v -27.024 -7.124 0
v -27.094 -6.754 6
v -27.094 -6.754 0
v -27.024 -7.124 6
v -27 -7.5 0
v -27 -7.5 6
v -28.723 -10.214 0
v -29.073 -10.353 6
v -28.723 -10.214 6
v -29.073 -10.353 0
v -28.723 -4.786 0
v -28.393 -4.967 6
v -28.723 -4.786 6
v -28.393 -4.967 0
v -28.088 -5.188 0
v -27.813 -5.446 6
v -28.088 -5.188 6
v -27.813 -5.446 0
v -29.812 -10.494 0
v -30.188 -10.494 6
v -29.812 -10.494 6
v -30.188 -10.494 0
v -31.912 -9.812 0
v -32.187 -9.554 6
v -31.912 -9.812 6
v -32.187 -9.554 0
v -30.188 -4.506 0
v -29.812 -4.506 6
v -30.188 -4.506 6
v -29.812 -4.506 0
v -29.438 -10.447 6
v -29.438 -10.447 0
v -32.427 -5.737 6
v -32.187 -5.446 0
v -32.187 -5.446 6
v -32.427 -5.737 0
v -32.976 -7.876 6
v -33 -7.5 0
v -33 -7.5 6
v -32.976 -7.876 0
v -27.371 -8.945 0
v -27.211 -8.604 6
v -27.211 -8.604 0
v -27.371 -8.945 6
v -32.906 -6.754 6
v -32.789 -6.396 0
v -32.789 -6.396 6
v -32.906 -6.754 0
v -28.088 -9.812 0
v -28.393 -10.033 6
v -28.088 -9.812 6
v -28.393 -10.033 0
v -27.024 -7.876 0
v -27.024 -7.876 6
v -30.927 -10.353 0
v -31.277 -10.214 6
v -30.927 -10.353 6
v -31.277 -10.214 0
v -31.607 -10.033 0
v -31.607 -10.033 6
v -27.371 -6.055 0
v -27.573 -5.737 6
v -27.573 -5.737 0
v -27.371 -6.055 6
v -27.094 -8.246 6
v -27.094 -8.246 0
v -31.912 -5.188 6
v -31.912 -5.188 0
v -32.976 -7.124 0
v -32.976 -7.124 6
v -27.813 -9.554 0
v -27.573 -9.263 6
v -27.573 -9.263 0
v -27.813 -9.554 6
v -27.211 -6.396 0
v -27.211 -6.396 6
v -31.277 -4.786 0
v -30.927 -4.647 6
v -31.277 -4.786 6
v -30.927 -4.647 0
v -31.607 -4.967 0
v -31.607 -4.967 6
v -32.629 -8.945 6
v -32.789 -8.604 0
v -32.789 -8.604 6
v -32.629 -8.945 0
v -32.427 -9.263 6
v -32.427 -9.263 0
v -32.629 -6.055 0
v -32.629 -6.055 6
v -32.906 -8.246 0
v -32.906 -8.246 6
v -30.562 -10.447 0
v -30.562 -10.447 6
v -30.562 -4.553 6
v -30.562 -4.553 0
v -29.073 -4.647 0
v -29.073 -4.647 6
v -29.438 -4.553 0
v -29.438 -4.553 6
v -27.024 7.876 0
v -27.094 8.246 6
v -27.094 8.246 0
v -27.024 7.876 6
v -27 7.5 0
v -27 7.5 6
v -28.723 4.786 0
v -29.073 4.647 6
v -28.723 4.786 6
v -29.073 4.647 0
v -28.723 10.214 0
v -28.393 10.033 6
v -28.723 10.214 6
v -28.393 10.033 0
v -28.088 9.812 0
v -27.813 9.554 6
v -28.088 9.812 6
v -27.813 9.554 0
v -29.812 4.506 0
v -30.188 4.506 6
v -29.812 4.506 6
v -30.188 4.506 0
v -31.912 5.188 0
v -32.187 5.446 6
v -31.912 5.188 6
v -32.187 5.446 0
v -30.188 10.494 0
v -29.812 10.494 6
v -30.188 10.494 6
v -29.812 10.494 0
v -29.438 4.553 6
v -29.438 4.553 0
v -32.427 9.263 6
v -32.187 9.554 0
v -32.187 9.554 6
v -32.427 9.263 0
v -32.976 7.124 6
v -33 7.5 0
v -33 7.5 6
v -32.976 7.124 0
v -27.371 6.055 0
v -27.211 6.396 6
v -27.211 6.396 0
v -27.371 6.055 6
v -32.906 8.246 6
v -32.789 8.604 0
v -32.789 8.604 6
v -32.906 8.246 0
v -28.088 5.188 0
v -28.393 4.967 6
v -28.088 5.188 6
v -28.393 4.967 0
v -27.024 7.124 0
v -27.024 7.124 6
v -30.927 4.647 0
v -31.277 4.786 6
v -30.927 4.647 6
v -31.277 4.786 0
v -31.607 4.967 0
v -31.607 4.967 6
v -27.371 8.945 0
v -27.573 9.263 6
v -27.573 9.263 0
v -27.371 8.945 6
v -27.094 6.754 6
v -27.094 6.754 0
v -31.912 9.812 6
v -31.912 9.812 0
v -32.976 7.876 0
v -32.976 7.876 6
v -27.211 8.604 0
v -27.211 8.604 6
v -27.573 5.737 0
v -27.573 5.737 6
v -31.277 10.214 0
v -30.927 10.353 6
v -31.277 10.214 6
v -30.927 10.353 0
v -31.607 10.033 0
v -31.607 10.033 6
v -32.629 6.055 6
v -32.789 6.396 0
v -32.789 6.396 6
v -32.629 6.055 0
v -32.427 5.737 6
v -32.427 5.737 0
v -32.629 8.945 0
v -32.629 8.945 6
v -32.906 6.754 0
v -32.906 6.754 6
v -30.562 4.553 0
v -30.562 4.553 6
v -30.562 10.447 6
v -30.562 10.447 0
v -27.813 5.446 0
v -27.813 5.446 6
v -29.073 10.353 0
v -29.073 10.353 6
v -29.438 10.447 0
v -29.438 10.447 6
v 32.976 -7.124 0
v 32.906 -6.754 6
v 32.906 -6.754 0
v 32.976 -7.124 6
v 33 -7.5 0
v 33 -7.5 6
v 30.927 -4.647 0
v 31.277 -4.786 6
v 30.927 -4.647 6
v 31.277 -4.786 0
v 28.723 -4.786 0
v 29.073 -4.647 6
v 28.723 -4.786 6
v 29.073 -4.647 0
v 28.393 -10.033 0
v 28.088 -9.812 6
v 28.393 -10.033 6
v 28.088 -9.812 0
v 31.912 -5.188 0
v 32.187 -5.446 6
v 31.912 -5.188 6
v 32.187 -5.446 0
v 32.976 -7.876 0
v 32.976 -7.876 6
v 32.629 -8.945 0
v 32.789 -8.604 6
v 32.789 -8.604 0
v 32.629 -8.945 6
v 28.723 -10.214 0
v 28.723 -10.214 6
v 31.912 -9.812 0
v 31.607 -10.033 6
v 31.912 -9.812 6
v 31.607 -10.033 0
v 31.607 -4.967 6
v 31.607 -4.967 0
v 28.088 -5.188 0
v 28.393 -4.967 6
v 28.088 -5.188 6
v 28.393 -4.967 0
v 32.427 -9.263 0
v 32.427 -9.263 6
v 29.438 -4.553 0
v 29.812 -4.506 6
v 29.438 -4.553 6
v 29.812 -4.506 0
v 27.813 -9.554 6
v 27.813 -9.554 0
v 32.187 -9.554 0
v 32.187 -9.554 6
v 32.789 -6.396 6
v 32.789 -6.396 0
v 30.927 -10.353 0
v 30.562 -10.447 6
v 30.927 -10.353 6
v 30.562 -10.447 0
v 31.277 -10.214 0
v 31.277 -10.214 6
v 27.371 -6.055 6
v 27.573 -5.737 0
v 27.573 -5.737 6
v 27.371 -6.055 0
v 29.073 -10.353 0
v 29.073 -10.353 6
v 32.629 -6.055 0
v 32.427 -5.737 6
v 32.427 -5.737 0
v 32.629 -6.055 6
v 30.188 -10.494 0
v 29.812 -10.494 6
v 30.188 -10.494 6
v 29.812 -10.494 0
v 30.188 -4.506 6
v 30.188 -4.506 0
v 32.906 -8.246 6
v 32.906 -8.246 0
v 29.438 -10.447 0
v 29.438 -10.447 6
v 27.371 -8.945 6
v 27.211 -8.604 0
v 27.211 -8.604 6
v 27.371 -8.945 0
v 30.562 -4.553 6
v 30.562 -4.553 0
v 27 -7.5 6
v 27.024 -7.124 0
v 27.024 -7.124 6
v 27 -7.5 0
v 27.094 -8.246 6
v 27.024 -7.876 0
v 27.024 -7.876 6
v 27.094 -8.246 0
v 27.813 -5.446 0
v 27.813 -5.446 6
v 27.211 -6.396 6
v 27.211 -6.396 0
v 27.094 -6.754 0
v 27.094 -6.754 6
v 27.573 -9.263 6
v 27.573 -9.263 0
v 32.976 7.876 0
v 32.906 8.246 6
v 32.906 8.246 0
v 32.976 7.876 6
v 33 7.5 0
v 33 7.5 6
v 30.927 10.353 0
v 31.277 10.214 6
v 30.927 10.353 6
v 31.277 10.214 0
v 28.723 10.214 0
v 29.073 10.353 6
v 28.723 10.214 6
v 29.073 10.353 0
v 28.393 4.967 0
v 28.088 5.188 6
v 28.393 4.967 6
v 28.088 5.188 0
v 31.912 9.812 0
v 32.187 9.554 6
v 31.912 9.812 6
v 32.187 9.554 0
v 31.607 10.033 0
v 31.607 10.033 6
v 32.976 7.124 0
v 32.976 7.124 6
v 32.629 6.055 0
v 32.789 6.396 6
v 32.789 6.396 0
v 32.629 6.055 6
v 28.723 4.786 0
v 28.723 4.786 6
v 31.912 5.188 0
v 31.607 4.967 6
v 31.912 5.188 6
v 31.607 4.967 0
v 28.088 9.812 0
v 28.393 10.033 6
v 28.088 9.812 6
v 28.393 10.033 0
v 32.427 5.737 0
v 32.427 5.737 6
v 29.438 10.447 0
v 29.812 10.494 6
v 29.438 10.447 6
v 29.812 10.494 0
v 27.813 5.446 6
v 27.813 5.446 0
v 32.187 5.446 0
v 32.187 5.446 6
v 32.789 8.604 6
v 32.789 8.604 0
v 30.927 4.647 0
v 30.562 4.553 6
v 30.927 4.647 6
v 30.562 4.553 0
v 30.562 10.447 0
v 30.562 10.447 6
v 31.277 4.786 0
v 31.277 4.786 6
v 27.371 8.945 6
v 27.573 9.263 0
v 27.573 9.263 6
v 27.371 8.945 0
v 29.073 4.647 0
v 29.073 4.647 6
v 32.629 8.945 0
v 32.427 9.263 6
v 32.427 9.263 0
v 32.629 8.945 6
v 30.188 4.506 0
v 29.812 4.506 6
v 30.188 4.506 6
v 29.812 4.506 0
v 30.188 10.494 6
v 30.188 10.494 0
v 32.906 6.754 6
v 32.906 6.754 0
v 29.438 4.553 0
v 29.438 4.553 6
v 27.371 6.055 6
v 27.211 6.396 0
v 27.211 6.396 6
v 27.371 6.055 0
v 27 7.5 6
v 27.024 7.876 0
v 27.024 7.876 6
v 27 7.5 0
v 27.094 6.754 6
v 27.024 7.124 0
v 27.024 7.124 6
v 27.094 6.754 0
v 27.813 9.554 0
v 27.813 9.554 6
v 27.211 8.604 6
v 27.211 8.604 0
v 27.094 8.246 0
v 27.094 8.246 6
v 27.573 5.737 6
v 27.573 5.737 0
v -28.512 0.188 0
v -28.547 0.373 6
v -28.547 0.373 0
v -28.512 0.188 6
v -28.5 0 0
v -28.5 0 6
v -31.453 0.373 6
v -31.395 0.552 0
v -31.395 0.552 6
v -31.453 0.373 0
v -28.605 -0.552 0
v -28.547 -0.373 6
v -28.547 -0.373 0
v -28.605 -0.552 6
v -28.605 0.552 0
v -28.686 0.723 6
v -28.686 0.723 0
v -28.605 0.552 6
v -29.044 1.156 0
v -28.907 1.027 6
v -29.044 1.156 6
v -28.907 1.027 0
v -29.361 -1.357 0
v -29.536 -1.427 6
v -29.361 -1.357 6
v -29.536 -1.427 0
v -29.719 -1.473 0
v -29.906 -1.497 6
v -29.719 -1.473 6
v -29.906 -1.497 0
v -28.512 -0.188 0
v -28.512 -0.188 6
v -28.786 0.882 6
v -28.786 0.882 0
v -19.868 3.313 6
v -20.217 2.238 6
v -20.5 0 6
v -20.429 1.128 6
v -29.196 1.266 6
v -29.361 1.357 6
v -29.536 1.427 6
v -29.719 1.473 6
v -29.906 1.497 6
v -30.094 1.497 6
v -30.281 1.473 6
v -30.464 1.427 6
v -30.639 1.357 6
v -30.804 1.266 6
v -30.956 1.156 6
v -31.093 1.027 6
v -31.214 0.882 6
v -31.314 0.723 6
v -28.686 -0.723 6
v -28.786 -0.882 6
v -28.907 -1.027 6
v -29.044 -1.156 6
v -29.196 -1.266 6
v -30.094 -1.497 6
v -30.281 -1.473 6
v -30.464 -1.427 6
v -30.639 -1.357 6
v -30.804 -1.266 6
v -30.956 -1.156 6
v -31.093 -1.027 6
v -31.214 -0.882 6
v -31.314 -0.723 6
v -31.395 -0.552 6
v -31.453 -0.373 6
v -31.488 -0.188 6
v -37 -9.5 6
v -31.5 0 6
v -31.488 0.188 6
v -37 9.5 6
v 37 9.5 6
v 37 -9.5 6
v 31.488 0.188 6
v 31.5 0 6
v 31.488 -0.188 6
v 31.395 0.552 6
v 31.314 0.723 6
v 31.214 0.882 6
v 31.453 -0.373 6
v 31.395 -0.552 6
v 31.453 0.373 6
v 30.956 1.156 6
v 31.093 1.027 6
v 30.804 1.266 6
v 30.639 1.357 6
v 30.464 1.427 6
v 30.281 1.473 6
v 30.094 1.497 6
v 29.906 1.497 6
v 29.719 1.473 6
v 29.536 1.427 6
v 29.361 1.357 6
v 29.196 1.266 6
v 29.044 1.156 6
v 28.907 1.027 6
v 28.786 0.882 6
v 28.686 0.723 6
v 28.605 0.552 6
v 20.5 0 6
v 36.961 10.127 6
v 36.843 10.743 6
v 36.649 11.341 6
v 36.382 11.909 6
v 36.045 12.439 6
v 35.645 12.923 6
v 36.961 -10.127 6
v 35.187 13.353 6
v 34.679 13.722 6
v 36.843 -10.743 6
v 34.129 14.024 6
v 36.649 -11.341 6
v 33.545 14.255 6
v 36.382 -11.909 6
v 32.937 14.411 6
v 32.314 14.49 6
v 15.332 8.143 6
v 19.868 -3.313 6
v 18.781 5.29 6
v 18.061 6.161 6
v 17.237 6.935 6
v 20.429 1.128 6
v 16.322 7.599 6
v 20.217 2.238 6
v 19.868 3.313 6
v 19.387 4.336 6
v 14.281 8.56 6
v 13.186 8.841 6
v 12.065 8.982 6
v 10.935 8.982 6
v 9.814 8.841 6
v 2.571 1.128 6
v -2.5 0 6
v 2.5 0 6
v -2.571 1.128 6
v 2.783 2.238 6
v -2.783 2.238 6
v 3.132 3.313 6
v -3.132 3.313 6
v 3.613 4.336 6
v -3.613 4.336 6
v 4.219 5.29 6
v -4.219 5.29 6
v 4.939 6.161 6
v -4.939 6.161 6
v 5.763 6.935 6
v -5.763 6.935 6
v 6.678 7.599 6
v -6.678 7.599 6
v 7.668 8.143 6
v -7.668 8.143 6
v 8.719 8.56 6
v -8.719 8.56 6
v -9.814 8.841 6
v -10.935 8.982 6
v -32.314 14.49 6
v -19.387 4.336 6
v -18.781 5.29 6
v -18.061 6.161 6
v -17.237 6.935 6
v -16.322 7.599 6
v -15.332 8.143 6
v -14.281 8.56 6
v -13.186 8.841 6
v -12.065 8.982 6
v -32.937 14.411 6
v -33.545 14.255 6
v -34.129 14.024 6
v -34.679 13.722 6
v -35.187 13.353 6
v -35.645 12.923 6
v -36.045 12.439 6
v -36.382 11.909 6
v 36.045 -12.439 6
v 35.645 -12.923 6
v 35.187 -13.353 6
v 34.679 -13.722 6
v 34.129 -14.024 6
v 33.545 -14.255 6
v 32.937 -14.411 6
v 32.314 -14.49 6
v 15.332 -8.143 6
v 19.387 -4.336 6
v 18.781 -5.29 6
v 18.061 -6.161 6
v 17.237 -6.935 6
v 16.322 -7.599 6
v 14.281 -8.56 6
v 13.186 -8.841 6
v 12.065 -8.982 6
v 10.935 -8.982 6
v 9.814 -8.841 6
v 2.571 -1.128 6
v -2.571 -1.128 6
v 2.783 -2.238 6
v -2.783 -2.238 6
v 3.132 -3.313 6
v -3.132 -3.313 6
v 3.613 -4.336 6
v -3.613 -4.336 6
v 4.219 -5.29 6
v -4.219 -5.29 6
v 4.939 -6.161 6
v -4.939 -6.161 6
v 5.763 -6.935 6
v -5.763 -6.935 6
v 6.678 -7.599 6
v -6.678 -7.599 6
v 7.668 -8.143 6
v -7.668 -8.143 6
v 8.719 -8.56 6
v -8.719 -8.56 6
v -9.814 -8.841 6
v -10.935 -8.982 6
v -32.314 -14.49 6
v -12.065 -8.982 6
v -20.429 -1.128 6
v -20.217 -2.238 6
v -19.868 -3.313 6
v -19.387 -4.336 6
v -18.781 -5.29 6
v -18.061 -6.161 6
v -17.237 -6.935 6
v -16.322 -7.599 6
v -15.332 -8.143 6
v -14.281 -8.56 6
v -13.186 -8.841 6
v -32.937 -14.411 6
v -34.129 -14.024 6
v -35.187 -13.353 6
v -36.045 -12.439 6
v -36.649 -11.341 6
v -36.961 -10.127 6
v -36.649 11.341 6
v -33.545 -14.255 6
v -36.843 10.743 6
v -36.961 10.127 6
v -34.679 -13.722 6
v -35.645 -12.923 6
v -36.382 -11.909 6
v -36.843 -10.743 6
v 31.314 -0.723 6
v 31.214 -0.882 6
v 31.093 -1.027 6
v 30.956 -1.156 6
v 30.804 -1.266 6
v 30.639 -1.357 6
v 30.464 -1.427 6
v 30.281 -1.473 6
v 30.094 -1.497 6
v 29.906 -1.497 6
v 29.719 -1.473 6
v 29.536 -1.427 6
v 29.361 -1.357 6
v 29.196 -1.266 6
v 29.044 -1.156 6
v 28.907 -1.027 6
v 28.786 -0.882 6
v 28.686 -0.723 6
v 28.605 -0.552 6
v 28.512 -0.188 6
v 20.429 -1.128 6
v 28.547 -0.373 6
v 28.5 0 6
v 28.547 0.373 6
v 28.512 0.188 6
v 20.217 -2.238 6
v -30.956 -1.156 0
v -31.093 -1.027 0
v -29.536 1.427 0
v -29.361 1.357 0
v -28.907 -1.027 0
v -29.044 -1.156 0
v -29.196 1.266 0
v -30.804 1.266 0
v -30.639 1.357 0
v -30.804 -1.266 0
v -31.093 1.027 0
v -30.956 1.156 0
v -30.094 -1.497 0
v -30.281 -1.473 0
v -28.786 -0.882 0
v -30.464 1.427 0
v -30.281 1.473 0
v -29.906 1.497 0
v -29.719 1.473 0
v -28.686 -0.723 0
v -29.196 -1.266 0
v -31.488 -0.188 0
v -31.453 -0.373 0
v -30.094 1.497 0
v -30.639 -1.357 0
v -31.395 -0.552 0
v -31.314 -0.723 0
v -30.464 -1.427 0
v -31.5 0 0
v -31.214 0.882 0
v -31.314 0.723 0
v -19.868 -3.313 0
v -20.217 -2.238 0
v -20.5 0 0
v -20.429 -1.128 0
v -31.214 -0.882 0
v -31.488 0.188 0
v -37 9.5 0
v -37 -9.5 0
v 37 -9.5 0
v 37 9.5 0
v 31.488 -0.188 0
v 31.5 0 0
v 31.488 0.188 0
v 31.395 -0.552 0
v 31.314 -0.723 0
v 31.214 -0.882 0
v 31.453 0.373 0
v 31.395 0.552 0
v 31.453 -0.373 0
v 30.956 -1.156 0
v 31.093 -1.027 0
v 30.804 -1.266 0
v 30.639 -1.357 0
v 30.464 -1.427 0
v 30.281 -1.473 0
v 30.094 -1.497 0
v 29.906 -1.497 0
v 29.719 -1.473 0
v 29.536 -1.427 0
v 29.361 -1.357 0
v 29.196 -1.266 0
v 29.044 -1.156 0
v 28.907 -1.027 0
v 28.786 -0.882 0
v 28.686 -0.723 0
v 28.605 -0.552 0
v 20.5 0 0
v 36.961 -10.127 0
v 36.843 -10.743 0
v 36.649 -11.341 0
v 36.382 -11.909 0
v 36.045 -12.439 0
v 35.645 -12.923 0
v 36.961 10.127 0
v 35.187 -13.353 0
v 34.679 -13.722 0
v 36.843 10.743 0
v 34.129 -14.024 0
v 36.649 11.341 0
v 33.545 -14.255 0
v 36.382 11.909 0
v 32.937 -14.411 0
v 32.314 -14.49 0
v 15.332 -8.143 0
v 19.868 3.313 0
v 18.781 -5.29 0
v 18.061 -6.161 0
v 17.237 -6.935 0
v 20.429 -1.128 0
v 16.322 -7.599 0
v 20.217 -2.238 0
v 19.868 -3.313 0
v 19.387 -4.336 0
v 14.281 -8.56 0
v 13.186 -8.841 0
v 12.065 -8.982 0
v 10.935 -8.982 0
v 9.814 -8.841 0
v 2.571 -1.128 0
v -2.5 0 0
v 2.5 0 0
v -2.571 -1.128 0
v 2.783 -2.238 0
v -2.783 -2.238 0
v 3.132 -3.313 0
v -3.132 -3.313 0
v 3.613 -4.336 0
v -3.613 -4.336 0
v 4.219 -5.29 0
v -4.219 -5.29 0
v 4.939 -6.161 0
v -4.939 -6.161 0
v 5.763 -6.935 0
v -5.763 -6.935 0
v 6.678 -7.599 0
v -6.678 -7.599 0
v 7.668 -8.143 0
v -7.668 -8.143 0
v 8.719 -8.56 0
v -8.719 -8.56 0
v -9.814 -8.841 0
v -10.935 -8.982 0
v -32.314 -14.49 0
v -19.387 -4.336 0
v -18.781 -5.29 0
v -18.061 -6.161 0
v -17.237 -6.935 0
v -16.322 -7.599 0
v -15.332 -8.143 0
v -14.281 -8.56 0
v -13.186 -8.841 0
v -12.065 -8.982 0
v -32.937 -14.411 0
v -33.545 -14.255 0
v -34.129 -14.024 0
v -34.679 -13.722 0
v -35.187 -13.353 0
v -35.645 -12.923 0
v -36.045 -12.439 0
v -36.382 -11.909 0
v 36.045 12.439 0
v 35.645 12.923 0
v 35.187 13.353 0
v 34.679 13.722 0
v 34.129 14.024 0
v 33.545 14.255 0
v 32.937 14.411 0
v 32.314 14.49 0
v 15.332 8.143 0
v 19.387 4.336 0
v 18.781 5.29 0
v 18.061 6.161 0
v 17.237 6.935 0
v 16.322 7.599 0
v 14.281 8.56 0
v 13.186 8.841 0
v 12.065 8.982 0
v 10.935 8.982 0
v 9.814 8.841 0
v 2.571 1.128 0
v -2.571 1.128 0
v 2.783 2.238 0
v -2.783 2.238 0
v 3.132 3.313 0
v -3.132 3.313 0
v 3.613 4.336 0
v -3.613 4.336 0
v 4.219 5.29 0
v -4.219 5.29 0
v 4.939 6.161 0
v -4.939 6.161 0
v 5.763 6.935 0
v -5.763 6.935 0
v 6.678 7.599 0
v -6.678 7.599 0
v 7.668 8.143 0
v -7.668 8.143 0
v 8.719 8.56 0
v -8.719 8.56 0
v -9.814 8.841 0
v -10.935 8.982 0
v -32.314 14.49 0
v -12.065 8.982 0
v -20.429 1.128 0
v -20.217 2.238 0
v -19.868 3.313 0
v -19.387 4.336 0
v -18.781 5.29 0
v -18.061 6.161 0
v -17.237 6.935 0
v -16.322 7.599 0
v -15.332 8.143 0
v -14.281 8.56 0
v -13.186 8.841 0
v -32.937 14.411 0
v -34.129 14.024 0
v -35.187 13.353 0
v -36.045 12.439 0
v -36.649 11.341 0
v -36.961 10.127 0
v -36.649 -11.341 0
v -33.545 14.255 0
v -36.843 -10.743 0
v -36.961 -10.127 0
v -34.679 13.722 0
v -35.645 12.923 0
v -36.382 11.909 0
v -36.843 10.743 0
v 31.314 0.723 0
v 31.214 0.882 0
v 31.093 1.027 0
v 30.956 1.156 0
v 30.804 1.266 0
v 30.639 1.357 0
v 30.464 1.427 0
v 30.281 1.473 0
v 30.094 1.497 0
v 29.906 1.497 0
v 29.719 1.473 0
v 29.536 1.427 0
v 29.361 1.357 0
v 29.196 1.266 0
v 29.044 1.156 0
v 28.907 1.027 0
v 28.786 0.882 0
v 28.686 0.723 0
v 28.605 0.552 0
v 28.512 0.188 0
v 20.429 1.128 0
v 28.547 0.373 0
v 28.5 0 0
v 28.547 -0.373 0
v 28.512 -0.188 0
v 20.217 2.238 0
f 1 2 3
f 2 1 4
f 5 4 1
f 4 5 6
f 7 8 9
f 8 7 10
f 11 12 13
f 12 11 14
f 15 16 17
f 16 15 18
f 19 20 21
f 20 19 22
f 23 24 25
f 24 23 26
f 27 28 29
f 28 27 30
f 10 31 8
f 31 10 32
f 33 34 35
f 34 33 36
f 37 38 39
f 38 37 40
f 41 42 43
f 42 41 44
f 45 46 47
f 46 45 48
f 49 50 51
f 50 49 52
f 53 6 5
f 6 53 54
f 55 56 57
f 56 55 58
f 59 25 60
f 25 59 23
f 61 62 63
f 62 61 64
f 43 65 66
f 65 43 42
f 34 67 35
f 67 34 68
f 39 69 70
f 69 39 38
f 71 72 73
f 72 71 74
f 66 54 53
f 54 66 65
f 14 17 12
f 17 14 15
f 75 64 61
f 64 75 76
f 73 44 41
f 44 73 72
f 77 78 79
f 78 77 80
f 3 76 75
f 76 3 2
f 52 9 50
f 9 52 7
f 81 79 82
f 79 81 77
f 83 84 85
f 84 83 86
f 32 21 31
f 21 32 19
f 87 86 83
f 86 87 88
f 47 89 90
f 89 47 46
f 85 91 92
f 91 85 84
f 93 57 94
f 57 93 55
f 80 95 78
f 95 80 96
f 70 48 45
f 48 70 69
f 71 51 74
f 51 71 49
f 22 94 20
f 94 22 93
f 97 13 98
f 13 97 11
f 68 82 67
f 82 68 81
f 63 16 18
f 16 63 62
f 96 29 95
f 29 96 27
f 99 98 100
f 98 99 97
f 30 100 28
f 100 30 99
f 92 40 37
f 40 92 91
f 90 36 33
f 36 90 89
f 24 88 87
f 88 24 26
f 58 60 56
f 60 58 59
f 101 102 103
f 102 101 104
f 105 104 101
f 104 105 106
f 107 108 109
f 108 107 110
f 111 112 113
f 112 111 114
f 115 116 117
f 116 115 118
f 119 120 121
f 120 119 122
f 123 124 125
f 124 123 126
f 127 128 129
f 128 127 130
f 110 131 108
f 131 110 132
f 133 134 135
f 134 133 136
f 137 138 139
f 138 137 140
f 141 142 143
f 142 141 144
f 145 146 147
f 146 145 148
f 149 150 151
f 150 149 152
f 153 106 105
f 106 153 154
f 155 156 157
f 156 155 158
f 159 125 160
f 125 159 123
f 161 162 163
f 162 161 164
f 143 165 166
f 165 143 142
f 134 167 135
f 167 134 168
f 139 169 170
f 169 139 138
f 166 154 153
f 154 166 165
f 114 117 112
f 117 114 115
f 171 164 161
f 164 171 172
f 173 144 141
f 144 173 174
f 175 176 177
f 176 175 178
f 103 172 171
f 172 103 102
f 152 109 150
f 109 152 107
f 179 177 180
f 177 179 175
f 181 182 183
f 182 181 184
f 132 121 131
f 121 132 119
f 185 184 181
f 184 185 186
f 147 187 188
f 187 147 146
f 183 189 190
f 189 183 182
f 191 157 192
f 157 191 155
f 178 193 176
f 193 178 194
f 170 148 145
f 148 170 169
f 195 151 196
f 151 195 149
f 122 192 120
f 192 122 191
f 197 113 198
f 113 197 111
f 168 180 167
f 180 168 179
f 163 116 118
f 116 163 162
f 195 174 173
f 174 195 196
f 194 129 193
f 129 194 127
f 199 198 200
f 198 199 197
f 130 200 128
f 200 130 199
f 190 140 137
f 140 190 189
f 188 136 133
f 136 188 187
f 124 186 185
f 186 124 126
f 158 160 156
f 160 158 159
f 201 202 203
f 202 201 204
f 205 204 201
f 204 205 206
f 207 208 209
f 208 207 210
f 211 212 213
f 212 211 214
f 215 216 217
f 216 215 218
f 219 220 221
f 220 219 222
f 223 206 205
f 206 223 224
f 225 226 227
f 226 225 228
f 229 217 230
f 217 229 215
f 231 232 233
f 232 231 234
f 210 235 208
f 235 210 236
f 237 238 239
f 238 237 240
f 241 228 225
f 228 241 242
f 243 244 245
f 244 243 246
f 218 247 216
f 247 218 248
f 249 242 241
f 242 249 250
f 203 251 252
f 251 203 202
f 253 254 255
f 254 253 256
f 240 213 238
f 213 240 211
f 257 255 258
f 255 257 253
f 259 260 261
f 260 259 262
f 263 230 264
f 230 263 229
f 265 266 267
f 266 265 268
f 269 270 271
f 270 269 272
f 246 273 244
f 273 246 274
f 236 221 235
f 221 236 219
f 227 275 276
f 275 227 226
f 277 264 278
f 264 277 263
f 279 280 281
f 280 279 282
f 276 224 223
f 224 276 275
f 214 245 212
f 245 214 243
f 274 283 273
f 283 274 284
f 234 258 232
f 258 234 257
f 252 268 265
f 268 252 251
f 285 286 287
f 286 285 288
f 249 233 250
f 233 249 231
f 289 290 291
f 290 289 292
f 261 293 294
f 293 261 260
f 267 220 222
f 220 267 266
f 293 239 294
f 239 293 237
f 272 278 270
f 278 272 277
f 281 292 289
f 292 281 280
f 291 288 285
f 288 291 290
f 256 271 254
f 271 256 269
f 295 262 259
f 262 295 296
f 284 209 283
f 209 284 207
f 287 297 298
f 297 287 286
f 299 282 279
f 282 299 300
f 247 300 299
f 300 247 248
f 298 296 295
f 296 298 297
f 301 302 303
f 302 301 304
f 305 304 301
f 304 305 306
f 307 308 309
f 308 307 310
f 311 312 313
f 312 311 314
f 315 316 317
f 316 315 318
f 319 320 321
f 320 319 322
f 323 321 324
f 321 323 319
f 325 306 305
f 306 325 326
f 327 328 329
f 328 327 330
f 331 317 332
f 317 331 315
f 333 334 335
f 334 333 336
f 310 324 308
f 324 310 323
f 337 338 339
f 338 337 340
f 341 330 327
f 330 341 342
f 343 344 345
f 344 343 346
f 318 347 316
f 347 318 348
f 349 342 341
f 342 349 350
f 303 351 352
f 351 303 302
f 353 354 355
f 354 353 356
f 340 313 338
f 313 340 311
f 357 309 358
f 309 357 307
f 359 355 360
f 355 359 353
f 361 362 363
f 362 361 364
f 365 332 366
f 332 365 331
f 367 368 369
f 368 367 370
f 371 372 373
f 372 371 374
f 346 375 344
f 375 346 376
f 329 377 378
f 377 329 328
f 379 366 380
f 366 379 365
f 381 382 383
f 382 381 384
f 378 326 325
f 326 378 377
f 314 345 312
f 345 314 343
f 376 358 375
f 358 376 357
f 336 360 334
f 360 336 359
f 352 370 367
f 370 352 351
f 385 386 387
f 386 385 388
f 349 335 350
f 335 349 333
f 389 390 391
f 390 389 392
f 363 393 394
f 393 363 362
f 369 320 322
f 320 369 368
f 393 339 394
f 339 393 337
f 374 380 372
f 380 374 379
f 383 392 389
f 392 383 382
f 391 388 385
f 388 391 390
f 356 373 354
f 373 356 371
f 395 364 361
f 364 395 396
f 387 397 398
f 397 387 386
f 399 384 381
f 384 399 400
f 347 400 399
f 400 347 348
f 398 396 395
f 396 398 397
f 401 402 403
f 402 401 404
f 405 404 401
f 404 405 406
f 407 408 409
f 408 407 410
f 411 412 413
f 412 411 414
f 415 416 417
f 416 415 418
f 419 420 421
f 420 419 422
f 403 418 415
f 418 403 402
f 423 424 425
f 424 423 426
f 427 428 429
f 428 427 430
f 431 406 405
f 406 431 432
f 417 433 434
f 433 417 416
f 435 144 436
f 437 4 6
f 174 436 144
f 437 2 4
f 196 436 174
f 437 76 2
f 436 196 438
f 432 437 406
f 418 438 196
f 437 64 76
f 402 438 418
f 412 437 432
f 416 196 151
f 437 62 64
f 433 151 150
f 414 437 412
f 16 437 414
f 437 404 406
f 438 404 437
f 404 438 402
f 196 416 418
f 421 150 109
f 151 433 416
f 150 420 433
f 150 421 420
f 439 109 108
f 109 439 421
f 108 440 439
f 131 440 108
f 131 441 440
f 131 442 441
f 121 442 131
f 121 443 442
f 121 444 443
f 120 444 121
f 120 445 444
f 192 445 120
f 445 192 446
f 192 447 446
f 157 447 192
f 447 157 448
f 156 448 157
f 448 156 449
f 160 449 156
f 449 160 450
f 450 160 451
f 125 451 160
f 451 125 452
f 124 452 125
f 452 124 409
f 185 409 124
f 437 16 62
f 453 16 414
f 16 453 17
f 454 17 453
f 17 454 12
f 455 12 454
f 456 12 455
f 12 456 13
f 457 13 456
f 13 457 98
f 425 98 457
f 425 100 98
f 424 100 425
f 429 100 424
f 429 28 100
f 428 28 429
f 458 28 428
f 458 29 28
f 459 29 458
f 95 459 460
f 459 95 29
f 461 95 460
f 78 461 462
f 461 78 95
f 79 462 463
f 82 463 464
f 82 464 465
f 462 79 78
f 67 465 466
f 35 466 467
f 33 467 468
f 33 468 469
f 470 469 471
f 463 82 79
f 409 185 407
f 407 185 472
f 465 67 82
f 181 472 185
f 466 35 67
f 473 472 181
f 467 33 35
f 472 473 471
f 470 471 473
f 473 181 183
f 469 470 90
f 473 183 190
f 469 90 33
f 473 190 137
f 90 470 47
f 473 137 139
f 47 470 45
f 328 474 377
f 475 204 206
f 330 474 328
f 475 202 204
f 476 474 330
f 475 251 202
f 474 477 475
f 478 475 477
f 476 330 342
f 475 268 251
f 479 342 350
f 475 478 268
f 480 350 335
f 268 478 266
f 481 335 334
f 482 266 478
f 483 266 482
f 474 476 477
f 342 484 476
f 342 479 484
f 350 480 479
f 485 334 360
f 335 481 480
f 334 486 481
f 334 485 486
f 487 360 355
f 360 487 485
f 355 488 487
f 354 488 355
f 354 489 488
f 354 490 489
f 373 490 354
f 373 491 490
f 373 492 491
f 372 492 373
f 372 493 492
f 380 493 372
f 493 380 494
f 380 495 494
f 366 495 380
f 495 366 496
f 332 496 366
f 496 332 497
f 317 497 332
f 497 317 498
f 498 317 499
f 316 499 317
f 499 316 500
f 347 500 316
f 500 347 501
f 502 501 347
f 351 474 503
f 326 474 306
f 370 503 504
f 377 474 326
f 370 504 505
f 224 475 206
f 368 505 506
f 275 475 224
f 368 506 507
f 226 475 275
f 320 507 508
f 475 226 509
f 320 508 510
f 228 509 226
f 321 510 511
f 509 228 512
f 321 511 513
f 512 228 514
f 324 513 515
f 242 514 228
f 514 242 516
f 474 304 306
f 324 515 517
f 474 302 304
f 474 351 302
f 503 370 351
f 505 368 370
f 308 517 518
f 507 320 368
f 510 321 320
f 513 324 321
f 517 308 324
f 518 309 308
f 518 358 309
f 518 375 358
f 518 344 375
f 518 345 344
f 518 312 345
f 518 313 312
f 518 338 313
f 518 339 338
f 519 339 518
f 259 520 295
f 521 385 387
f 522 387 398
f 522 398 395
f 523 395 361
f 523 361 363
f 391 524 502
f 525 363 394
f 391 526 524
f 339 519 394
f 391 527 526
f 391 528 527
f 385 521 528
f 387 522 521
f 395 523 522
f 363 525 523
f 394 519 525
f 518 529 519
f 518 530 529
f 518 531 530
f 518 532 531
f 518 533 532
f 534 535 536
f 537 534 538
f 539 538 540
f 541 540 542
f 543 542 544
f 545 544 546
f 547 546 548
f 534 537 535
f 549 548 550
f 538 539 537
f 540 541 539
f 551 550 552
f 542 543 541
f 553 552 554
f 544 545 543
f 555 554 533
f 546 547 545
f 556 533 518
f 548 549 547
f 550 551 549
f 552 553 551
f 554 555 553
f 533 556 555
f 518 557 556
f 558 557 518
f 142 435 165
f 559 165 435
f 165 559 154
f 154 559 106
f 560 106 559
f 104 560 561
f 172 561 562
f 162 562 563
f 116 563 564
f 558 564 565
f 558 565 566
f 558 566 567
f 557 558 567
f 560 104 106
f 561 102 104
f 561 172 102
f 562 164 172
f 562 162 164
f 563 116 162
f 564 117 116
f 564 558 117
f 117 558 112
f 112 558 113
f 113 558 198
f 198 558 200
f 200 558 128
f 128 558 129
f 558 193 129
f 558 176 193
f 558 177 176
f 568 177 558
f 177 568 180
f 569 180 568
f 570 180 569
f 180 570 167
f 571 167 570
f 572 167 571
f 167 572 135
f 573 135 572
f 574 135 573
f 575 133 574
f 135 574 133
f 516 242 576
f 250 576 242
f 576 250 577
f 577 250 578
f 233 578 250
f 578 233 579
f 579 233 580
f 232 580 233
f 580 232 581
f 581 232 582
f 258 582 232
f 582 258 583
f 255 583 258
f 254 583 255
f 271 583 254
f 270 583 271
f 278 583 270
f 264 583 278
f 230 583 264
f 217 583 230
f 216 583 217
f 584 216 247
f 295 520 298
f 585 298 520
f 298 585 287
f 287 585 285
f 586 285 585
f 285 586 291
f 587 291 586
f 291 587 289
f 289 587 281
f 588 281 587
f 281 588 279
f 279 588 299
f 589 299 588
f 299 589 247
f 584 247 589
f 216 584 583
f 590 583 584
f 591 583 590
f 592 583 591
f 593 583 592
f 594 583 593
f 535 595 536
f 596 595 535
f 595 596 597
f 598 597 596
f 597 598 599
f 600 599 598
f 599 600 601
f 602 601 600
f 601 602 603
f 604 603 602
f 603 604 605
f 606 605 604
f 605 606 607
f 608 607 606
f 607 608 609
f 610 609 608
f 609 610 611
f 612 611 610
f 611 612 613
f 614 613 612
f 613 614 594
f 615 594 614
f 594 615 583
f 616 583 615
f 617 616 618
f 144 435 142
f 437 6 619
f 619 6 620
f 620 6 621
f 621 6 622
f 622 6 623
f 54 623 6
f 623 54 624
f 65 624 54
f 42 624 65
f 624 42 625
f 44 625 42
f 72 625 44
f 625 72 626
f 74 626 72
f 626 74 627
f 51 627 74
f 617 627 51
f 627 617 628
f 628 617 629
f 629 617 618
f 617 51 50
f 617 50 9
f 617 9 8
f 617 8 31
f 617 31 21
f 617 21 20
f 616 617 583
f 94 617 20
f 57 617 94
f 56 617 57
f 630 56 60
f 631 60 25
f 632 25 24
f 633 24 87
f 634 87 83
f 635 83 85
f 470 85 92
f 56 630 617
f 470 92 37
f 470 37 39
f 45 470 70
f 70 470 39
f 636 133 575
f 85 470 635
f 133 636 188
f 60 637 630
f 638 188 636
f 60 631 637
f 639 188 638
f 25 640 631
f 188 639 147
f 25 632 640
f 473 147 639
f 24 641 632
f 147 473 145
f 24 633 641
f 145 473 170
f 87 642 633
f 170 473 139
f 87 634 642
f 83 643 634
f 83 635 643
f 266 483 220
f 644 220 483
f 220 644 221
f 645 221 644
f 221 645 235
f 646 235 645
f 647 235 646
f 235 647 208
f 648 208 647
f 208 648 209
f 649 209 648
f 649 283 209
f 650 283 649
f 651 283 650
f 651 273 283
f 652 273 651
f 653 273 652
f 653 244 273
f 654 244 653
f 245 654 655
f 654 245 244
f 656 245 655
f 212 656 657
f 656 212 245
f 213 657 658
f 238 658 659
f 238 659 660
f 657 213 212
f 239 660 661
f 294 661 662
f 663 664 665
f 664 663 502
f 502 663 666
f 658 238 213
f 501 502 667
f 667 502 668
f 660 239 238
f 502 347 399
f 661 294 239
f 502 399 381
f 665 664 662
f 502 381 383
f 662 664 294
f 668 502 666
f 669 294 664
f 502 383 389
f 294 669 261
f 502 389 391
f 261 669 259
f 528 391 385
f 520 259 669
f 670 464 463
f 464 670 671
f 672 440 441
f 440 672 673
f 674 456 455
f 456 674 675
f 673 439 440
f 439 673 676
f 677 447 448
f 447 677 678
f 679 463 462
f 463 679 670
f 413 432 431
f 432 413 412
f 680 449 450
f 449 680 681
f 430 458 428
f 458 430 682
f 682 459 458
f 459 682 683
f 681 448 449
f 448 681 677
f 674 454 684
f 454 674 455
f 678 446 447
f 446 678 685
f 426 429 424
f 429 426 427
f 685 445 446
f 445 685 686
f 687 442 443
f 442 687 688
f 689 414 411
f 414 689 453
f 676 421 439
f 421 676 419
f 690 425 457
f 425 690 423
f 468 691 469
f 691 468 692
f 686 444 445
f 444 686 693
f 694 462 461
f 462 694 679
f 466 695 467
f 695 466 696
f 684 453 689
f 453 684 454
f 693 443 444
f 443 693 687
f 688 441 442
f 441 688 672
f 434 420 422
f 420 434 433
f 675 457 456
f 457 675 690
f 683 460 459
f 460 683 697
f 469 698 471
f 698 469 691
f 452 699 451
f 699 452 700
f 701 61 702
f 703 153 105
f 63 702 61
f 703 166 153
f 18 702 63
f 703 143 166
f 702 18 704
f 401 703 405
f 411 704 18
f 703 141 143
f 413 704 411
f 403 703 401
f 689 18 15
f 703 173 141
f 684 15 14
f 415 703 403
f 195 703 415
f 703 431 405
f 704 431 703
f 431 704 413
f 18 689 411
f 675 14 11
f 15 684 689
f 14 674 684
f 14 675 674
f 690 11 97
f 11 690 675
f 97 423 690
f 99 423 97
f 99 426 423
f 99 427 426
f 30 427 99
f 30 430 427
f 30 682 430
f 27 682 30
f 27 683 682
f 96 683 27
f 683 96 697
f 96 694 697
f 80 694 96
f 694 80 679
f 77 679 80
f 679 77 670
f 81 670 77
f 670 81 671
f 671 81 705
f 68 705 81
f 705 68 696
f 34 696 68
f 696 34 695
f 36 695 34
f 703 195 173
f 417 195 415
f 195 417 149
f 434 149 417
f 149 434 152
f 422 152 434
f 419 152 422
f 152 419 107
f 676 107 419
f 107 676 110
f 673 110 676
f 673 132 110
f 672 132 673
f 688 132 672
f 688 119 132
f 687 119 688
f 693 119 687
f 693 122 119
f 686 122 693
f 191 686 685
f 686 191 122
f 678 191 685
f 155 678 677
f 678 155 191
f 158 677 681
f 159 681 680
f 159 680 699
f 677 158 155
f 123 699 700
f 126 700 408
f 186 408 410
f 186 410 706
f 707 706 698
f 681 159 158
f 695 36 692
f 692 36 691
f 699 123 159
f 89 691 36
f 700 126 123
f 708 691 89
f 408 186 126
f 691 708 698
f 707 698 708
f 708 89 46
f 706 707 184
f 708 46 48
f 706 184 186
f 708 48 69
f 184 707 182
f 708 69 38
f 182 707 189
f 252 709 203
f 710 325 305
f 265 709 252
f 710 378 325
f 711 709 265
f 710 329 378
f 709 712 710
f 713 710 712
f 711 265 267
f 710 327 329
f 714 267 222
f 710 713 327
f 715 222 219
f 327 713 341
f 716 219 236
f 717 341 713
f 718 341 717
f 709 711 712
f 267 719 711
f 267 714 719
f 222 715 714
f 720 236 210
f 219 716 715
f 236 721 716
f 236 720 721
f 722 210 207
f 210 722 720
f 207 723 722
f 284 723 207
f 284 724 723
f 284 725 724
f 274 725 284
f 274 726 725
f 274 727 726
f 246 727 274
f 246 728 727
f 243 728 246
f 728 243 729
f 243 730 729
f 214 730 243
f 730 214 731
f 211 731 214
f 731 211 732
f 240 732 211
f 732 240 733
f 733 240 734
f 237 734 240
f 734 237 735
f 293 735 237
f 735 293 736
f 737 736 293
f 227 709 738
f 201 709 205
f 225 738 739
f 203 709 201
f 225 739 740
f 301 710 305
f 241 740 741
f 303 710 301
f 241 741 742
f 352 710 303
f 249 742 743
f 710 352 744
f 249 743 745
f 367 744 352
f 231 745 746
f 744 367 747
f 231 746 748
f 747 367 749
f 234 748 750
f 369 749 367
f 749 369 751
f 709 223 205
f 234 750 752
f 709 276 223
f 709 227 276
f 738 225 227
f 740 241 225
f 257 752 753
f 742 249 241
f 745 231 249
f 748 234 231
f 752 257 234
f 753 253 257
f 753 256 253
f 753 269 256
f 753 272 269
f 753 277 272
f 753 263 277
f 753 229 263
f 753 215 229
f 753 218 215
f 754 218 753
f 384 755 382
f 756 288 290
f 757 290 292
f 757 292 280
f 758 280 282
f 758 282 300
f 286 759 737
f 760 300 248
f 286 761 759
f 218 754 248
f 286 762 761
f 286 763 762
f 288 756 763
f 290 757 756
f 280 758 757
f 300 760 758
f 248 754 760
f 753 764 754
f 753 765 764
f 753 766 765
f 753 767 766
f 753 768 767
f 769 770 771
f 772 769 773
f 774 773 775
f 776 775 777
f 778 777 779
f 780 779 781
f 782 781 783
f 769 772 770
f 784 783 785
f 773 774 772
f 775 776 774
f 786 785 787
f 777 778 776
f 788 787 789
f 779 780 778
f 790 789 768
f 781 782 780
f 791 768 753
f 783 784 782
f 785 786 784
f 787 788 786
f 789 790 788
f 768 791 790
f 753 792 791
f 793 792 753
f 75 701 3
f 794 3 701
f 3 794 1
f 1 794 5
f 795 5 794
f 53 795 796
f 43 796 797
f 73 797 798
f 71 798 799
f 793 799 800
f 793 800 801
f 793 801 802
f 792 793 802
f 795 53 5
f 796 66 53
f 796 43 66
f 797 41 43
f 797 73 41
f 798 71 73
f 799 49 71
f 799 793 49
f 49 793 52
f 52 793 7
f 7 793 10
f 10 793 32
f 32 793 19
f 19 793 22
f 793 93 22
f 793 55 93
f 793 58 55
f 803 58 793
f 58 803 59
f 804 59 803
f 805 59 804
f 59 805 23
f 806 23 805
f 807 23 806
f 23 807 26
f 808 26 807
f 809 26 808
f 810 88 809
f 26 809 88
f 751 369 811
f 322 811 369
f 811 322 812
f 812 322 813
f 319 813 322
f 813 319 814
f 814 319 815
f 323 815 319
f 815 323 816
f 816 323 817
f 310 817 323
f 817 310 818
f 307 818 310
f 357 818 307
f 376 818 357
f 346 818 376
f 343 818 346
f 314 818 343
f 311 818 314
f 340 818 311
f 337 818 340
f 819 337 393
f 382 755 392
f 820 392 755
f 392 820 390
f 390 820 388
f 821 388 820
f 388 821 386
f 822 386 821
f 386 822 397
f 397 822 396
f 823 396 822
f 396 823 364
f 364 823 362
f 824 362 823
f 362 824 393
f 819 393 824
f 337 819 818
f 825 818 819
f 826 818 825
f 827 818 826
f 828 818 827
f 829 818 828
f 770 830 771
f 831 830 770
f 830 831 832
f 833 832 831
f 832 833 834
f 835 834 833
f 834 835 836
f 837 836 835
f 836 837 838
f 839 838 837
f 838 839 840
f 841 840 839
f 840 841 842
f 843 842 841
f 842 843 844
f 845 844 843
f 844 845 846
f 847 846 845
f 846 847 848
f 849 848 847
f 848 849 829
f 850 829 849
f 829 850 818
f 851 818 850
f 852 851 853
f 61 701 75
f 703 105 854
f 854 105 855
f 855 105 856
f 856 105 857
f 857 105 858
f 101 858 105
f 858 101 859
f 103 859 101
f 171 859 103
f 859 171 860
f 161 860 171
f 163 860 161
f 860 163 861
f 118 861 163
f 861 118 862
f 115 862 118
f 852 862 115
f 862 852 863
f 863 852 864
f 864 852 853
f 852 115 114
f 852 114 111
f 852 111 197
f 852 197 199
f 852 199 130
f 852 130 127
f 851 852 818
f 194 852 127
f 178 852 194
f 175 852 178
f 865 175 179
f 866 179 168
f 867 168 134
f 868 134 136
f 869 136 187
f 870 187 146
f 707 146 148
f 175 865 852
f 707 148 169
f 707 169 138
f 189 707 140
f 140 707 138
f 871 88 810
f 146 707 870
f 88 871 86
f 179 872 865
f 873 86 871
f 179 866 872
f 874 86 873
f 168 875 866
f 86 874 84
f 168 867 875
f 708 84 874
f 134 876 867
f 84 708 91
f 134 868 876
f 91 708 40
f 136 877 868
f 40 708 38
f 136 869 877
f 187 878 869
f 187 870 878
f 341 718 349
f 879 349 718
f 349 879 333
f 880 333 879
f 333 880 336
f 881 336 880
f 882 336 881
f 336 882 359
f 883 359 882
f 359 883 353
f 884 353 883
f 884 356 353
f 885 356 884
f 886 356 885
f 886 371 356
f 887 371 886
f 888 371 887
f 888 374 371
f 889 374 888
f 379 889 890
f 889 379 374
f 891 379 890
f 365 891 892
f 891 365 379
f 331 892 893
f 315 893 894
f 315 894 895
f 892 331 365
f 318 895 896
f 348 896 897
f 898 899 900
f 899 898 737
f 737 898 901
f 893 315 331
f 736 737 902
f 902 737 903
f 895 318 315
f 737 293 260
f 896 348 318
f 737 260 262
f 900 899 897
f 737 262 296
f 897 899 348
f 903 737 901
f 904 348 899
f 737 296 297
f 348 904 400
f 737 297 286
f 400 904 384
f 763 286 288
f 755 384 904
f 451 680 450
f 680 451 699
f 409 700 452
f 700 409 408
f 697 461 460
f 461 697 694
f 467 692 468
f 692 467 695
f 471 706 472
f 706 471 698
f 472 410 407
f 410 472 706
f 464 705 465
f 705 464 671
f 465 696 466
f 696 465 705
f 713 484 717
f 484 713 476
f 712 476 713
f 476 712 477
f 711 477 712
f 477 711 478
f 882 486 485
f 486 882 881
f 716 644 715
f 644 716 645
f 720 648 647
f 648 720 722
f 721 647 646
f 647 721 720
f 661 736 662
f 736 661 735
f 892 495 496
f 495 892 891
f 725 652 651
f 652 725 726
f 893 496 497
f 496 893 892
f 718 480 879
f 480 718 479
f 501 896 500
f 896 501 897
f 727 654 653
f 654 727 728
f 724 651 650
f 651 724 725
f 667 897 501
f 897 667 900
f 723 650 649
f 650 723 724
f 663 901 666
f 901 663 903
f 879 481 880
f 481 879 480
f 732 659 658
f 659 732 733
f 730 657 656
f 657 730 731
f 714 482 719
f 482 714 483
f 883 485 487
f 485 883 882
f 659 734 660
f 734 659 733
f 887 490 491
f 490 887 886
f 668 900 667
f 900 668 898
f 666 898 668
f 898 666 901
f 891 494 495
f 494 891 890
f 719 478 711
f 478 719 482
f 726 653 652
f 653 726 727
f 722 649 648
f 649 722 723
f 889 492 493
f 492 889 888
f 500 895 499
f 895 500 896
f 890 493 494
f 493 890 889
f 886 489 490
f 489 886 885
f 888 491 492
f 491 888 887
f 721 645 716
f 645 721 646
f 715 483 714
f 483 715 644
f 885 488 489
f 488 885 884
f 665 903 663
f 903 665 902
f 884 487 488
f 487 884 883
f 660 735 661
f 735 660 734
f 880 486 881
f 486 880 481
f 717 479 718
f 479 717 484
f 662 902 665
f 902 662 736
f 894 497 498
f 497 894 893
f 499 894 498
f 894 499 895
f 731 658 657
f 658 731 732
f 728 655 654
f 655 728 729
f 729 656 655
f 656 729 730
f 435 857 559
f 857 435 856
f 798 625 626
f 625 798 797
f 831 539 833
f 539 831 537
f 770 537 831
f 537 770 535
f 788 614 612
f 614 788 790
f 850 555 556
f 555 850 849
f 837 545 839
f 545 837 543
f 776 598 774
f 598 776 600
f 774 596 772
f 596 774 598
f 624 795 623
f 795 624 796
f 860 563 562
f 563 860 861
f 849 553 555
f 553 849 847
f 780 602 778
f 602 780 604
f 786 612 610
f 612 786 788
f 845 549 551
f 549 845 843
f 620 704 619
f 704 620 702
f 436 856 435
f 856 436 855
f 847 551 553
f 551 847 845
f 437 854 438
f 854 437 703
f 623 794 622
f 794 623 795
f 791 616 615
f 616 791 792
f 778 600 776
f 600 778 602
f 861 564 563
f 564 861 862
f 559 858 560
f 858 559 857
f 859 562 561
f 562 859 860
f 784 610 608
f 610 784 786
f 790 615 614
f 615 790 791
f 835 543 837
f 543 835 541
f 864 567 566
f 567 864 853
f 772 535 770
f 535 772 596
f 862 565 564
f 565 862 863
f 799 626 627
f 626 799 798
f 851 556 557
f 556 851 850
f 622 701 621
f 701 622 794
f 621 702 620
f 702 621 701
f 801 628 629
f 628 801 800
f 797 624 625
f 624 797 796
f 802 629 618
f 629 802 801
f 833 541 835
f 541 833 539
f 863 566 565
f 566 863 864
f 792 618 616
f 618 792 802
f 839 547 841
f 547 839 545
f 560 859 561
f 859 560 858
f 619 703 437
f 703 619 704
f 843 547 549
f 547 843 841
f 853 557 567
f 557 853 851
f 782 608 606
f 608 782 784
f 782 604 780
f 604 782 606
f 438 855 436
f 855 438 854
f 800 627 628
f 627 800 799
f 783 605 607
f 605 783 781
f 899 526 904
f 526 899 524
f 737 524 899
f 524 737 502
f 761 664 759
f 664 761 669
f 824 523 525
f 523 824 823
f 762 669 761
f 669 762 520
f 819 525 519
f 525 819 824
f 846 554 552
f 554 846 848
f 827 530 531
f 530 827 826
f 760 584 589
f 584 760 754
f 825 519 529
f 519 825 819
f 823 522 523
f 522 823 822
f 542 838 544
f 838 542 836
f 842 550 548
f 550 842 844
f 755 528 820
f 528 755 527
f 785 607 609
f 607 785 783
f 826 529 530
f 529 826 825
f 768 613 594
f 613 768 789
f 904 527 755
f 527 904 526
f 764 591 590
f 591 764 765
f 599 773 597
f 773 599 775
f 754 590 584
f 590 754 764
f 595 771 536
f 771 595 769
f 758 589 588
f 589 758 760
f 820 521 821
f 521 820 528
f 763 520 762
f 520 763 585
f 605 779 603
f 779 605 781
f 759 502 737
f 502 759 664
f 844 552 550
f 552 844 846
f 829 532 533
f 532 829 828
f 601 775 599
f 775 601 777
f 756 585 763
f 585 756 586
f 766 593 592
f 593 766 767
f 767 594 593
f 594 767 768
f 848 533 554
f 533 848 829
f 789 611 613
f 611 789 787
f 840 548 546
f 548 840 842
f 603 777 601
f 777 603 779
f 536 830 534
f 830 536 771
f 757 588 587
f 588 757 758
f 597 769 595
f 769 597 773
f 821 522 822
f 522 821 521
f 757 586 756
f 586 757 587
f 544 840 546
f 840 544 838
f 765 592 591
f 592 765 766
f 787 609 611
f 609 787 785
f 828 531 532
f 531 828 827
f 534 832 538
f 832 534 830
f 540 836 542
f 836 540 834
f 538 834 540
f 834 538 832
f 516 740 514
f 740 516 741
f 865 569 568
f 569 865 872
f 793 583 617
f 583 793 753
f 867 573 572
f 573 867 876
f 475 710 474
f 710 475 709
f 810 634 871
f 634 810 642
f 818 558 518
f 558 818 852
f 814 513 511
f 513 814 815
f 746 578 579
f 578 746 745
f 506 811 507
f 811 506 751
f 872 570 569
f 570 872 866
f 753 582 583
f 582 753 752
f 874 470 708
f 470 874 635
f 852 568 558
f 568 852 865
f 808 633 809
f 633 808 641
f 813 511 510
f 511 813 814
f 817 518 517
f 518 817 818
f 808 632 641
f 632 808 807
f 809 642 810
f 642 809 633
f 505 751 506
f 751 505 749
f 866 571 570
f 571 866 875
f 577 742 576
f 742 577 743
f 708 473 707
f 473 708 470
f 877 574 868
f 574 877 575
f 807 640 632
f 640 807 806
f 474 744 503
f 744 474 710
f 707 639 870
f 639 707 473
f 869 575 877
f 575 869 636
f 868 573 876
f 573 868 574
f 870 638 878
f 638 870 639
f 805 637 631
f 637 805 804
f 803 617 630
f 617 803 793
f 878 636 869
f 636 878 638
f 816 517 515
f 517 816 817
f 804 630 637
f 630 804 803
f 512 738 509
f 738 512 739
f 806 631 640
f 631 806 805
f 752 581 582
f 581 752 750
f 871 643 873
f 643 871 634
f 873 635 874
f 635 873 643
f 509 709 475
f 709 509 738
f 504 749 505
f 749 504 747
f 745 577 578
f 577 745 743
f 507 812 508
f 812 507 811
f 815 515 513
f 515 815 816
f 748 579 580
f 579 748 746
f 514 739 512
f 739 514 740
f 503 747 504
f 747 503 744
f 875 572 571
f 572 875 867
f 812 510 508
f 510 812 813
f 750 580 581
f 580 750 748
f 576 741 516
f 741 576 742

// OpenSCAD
$fn = 50;


difference() {
	union() {
		hull() {
			translate(v = [-32.0000000000, 9.5000000000, 0]) {
				cylinder(h = 6, r = 5);
			}
			translate(v = [32.0000000000, 9.5000000000, 0]) {
				cylinder(h = 6, r = 5);
			}
			translate(v = [-32.0000000000, -9.5000000000, 0]) {
				cylinder(h = 6, r = 5);
			}
			translate(v = [32.0000000000, -9.5000000000, 0]) {
				cylinder(h = 6, r = 5);
			}
		}
	}
	union() {
		#translate(v = [-30.0000000000, -7.5000000000, 0]) {
			cylinder(h = 6, r = 3.0000000000);
		}
		#translate(v = [-30.0000000000, 7.5000000000, 0]) {
			cylinder(h = 6, r = 3.0000000000);
		}
		#translate(v = [30.0000000000, -7.5000000000, 0]) {
			cylinder(h = 6, r = 3.0000000000);
		}
		#translate(v = [30.0000000000, 7.5000000000, 0]) {
			cylinder(h = 6, r = 3.0000000000);
		}
		#translate(v = [-30.0000000000, -7.5000000000, -100.0000000000]) {
			cylinder(h = 200, r = 3.0000000000);
		}
		#translate(v = [-30.0000000000, 7.5000000000, -100.0000000000]) {
			cylinder(h = 200, r = 3.0000000000);
		}
		#translate(v = [30.0000000000, -7.5000000000, -100.0000000000]) {
			cylinder(h = 200, r = 3.0000000000);
		}
		#translate(v = [30.0000000000, 7.5000000000, -100.0000000000]) {
			cylinder(h = 200, r = 3.0000000000);
		}
		#translate(v = [-30.0000000000, -7.5000000000, 0]) {
			cylinder(h = 6, r = 1.5000000000);
		}
		#translate(v = [-30.0000000000, 0.0000000000, 0]) {
			cylinder(h = 6, r = 1.5000000000);
		}
		#translate(v = [-30.0000000000, 7.5000000000, 0]) {
			cylinder(h = 6, r = 1.5000000000);
		}
		#translate(v = [30.0000000000, -7.5000000000, 0]) {
			cylinder(h = 6, r = 1.5000000000);
		}
		#translate(v = [30.0000000000, 0.0000000000, 0]) {
			cylinder(h = 6, r = 1.5000000000);
		}
		#translate(v = [30.0000000000, 7.5000000000, 0]) {
			cylinder(h = 6, r = 1.5000000000);
		}
		#translate(v = [-30.0000000000, -7.5000000000, 0]) {
			cylinder(h = 6, r = 1.5000000000);
		}
		#translate(v = [-30.0000000000, 0.0000000000, 0]) {
			cylinder(h = 6, r = 1.5000000000);
		}
		#translate(v = [-30.0000000000, 7.5000000000, 0]) {
			cylinder(h = 6, r = 1.5000000000);
		}
		#translate(v = [30.0000000000, -7.5000000000, 0]) {
			cylinder(h = 6, r = 1.5000000000);
		}
		#translate(v = [30.0000000000, 0.0000000000, 0]) {
			cylinder(h = 6, r = 1.5000000000);
		}
		#translate(v = [30.0000000000, 7.5000000000, 0]) {
			cylinder(h = 6, r = 1.5000000000);
		}
		#translate(v = [-30.0000000000, -7.5000000000, 0]) {
			cylinder(h = 6, r = 1.5000000000);
		}
		#translate(v = [-30.0000000000, 0.0000000000, 0]) {
			cylinder(h = 6, r = 1.5000000000);
		}
		#translate(v = [-30.0000000000, 7.5000000000, 0]) {
			cylinder(h = 6, r = 1.5000000000);
		}
		#translate(v = [30.0000000000, -7.5000000000, 0]) {
			cylinder(h = 6, r = 1.5000000000);
		}
		#translate(v = [30.0000000000, 0.0000000000, 0]) {
			cylinder(h = 6, r = 1.5000000000);
		}
		#translate(v = [30.0000000000, 7.5000000000, 0]) {
			cylinder(h = 6, r = 1.5000000000);
		}
		#translate(v = [-11.5000000000, 0, 0]) {
			cylinder(h = 6, r = 9.0000000000);
		}
		#translate(v = [11.5000000000, 0, 0]) {
			cylinder(h = 6, r = 9.0000000000);
		}
	}
}
